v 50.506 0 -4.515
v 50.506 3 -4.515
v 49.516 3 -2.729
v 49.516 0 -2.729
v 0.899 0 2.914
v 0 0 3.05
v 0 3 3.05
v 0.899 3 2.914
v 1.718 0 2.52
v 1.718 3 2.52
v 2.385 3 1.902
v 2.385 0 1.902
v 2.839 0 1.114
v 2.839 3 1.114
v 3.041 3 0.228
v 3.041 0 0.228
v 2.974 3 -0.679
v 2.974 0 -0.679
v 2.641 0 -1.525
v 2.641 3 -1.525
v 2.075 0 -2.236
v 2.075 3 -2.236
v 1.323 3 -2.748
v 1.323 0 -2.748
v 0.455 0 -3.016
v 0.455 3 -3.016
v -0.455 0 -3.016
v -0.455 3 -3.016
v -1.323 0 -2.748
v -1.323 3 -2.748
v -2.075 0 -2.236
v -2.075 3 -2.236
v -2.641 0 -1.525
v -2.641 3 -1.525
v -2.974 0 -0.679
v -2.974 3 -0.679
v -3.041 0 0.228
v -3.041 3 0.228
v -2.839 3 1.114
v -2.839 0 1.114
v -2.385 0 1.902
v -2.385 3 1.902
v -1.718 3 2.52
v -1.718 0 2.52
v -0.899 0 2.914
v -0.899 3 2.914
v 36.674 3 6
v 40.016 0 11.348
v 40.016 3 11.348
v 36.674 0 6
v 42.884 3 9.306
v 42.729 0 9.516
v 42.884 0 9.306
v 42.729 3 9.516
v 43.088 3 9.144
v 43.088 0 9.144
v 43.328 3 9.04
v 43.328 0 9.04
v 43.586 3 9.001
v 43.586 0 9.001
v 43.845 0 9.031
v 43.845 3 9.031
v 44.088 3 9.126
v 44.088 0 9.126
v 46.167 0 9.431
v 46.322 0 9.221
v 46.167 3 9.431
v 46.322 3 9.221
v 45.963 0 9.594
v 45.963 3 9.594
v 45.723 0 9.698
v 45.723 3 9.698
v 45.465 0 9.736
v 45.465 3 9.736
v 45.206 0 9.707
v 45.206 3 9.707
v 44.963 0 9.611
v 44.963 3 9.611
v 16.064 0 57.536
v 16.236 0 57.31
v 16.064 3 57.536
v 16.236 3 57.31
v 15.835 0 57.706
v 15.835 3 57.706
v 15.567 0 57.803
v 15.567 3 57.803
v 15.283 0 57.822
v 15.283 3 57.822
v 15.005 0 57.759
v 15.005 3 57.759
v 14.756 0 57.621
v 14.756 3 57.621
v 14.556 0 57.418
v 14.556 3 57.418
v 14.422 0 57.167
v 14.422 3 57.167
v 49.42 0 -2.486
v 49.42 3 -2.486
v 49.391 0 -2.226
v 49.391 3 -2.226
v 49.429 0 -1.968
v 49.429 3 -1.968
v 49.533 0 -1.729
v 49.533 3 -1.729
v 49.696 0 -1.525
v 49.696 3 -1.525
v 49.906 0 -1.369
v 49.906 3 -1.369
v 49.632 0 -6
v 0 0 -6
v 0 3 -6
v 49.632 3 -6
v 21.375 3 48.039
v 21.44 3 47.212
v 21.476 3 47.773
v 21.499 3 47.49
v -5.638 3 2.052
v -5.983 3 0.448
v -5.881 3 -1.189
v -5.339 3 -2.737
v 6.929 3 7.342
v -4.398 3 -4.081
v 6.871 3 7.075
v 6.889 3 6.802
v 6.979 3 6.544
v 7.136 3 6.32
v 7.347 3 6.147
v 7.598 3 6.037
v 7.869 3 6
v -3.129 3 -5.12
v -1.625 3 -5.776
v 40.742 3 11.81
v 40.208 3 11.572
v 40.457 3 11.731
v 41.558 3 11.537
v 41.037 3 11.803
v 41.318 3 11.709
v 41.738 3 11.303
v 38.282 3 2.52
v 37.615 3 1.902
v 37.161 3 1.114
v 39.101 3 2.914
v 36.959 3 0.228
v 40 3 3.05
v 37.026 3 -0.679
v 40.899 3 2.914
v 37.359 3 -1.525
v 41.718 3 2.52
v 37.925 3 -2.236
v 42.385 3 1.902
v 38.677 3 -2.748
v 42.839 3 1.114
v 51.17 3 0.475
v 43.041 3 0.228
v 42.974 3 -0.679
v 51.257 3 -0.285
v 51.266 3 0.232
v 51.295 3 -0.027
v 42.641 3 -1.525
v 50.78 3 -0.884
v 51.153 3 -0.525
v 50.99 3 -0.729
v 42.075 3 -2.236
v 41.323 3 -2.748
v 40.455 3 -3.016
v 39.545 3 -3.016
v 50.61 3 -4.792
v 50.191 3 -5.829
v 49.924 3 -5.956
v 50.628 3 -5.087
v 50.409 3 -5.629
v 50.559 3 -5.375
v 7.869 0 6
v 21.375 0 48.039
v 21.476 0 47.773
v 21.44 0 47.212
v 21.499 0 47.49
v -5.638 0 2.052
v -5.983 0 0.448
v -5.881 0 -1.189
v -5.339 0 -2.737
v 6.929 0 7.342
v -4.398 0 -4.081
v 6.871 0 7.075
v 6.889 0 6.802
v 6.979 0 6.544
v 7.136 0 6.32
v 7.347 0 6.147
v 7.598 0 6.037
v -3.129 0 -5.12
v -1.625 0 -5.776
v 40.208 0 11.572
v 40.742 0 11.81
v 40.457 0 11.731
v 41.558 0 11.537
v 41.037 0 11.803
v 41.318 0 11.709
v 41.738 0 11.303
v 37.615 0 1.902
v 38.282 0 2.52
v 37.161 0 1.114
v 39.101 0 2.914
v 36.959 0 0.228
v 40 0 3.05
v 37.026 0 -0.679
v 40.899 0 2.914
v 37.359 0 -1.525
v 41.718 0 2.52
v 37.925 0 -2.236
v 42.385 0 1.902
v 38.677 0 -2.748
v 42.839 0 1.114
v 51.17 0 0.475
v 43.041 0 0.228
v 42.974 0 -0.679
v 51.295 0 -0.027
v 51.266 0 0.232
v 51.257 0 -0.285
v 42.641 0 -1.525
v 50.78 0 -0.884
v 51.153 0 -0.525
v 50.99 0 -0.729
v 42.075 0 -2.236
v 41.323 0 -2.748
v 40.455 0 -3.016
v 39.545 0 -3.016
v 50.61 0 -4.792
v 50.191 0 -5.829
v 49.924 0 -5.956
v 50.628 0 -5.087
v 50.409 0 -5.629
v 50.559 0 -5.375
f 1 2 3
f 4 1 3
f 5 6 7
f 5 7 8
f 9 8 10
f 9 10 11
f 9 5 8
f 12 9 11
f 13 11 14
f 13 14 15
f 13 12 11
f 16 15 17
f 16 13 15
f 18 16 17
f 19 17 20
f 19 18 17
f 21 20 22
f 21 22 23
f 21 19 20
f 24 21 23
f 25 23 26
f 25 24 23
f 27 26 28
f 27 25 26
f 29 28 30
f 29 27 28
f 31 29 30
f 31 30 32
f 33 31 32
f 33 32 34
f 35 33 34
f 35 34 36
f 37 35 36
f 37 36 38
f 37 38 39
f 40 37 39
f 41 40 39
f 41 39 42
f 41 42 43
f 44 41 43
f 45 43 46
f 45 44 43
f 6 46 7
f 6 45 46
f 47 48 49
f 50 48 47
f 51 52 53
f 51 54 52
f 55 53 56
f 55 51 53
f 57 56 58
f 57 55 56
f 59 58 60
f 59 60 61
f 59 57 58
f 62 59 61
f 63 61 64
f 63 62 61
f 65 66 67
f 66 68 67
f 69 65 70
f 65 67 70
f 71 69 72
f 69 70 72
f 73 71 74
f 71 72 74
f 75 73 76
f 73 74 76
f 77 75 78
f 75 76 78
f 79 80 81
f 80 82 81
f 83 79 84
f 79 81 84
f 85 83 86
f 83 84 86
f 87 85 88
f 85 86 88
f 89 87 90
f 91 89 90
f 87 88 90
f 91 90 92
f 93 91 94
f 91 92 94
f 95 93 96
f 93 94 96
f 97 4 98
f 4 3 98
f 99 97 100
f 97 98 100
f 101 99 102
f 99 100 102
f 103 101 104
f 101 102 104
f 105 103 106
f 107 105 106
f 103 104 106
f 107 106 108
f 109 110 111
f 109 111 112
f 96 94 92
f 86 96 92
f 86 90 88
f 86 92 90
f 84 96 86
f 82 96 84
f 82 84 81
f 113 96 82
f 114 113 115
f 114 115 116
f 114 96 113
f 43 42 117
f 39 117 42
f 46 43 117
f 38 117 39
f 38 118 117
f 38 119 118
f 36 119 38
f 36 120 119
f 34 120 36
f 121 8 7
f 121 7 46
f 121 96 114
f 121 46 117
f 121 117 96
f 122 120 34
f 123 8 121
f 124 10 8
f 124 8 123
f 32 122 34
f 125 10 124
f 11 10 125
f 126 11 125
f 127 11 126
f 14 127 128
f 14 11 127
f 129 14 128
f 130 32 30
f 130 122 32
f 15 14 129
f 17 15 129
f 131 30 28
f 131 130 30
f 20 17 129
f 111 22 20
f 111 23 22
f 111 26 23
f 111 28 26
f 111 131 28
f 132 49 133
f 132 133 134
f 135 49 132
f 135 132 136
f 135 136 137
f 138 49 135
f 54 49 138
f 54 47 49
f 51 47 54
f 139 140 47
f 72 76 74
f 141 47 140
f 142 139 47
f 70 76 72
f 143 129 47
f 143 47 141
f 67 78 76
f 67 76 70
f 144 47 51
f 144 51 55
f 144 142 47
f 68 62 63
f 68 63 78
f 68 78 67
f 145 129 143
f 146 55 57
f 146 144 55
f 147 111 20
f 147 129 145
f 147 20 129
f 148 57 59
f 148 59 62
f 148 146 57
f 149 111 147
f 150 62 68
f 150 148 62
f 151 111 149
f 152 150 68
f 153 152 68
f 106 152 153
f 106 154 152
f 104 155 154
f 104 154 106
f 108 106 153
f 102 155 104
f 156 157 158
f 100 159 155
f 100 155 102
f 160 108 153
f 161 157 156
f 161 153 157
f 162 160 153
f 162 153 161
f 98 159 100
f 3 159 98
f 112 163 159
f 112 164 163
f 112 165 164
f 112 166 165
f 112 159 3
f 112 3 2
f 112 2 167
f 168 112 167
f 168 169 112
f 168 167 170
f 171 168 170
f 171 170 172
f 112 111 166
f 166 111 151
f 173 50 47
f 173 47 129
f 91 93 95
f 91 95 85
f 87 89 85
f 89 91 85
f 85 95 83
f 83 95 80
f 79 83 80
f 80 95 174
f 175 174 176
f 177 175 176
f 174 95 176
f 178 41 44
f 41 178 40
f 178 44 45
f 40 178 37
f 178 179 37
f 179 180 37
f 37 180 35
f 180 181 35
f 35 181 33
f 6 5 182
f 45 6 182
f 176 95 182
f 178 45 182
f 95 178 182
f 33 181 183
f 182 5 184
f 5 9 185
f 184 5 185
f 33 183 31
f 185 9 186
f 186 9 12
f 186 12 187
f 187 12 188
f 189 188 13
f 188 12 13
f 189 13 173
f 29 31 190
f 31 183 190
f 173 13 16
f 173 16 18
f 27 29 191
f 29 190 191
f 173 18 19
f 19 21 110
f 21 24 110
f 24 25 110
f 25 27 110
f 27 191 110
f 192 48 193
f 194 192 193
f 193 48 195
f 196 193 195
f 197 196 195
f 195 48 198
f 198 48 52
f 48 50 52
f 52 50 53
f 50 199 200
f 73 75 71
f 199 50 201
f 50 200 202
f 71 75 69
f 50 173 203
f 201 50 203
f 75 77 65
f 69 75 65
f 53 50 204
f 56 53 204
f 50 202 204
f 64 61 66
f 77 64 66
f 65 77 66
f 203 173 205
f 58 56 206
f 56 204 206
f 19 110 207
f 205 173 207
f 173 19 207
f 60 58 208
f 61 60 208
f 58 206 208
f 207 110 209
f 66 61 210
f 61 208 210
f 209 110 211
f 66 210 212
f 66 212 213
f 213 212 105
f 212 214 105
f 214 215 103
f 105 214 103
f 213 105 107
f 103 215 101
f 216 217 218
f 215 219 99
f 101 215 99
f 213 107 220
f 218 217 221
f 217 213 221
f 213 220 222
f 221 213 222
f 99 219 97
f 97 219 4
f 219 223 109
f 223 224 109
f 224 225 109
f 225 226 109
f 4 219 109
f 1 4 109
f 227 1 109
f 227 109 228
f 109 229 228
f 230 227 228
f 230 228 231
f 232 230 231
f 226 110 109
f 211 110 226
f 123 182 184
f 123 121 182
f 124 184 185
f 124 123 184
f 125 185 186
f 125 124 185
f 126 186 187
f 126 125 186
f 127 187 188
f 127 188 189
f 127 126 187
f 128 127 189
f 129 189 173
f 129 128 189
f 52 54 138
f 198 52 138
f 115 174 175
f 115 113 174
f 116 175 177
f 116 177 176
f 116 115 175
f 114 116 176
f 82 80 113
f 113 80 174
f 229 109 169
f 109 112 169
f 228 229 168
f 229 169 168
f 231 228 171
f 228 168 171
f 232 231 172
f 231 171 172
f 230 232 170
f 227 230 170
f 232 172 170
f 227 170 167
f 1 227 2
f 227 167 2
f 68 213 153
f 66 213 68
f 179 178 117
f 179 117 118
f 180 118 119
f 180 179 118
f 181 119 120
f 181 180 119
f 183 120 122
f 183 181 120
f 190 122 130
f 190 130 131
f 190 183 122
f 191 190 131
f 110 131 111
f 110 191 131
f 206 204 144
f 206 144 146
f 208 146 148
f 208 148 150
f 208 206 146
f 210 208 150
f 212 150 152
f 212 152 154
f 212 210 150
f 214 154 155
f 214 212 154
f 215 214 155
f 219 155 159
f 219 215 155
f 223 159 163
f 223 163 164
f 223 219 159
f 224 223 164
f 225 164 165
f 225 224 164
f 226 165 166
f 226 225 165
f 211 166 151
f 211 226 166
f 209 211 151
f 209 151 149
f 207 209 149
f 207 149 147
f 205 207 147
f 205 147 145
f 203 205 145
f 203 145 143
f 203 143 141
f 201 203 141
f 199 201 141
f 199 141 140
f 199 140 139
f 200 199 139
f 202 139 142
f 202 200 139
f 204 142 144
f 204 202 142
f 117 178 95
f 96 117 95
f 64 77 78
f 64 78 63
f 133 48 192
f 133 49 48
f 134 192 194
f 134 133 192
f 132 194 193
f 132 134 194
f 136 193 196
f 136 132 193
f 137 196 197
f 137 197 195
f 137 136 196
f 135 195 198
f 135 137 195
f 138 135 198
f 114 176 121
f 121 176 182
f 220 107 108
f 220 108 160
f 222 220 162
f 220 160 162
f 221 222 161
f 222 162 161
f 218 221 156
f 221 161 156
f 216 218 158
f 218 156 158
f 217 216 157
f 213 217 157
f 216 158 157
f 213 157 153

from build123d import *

# Parameters (mm, degrees)
SKETCH1_R           = 3.05
BOSS_EXTRUDE1_DEPTH = 3
BOSS_EXTRUDE2_DEPTH = 3
FILLET1_R           = 1


# Read off the part's stored shape, not the designer's step: Boss-Extrude2
with BuildPart() as part:
    # Sketch1 → Boss-Extrude1 (new body)
    with BuildSketch(Plane(origin=(0, 0, 0), x_dir=(1, 0, 0), z_dir=(0, 1, 0))):
        with BuildLine():
            Line((0, 6), (40, 6))
            Line((40, 6), (51.329332784, 6))
            Line((51.329332784, 6), (49.031195671, 1.854050901))
            Line((49.031195671, 1.854050901), (51.655054793, 0.39962204))
            Line((51.655054793, 0.39962204), (45.83733935, -10.095814445))
            Line((45.83733935, -10.095814445), (43.213480228, -8.641385585))
            Line((43.213480228, -8.641385585), (40.915343116, -12.787334683))
            Line((40.915343116, -12.787334683), (36.674145691, -6))
            Line((36.674145691, -6), (0, -6))
            ThreePointArc((0, -6), (-6, 0), (0, 6))
        make_face()
        with Locations(Location((0, 0, 0), (0, 0, 270))):
            Circle(SKETCH1_R, mode=Mode.SUBTRACT)
        with Locations(Location((40, 0, 0), (0, 0, 270))):
            Circle(SKETCH1_R, mode=Mode.SUBTRACT)
    extrude(amount=BOSS_EXTRUDE1_DEPTH)

    # Boss-Extrude2 outline → Boss-Extrude2 (add)
    with BuildSketch(Plane(origin=(0, 0, 0), x_dir=(1, 0, 0), z_dir=(0, 1, 0))):
        with BuildLine():
            Line((15.172439685, -59.228761833), (21.596230146, -47.639937071))
            Line((21.596230146, -47.639937071), (6.440532496, -6))
            Line((6.440532496, -6), (0, -6))
            ThreePointArc((0, -6), (-3.441458618, -4.914912266), (-5.638155725, -2.05212086))
            Line((-5.638155725, -2.05212086), (15.172439685, -59.228761833))
        make_face()
    extrude(amount=BOSS_EXTRUDE2_DEPTH)

    # Fillet1
    fillet1_edges = [part.edges().sort_by_distance(p)[0] for p in [
        (51.329332784, 1.5, -6),
        (49.031195671, 1.5, -1.854050901),
        (51.655054793, 1.5, -0.39962204),
        (45.83733935, 1.5, 10.095814445),
        (43.213480228, 1.5, 8.641385585),
        (40.915343116, 1.5, 12.787334683),
        (6.440532496, 1.5, 6),
        (21.596230146, 1.5, 47.639937071),
        (15.172439685, 1.5, 59.228761833),
    ]]
    fillet(fillet1_edges, radius=FILLET1_R)


solid = part.part
